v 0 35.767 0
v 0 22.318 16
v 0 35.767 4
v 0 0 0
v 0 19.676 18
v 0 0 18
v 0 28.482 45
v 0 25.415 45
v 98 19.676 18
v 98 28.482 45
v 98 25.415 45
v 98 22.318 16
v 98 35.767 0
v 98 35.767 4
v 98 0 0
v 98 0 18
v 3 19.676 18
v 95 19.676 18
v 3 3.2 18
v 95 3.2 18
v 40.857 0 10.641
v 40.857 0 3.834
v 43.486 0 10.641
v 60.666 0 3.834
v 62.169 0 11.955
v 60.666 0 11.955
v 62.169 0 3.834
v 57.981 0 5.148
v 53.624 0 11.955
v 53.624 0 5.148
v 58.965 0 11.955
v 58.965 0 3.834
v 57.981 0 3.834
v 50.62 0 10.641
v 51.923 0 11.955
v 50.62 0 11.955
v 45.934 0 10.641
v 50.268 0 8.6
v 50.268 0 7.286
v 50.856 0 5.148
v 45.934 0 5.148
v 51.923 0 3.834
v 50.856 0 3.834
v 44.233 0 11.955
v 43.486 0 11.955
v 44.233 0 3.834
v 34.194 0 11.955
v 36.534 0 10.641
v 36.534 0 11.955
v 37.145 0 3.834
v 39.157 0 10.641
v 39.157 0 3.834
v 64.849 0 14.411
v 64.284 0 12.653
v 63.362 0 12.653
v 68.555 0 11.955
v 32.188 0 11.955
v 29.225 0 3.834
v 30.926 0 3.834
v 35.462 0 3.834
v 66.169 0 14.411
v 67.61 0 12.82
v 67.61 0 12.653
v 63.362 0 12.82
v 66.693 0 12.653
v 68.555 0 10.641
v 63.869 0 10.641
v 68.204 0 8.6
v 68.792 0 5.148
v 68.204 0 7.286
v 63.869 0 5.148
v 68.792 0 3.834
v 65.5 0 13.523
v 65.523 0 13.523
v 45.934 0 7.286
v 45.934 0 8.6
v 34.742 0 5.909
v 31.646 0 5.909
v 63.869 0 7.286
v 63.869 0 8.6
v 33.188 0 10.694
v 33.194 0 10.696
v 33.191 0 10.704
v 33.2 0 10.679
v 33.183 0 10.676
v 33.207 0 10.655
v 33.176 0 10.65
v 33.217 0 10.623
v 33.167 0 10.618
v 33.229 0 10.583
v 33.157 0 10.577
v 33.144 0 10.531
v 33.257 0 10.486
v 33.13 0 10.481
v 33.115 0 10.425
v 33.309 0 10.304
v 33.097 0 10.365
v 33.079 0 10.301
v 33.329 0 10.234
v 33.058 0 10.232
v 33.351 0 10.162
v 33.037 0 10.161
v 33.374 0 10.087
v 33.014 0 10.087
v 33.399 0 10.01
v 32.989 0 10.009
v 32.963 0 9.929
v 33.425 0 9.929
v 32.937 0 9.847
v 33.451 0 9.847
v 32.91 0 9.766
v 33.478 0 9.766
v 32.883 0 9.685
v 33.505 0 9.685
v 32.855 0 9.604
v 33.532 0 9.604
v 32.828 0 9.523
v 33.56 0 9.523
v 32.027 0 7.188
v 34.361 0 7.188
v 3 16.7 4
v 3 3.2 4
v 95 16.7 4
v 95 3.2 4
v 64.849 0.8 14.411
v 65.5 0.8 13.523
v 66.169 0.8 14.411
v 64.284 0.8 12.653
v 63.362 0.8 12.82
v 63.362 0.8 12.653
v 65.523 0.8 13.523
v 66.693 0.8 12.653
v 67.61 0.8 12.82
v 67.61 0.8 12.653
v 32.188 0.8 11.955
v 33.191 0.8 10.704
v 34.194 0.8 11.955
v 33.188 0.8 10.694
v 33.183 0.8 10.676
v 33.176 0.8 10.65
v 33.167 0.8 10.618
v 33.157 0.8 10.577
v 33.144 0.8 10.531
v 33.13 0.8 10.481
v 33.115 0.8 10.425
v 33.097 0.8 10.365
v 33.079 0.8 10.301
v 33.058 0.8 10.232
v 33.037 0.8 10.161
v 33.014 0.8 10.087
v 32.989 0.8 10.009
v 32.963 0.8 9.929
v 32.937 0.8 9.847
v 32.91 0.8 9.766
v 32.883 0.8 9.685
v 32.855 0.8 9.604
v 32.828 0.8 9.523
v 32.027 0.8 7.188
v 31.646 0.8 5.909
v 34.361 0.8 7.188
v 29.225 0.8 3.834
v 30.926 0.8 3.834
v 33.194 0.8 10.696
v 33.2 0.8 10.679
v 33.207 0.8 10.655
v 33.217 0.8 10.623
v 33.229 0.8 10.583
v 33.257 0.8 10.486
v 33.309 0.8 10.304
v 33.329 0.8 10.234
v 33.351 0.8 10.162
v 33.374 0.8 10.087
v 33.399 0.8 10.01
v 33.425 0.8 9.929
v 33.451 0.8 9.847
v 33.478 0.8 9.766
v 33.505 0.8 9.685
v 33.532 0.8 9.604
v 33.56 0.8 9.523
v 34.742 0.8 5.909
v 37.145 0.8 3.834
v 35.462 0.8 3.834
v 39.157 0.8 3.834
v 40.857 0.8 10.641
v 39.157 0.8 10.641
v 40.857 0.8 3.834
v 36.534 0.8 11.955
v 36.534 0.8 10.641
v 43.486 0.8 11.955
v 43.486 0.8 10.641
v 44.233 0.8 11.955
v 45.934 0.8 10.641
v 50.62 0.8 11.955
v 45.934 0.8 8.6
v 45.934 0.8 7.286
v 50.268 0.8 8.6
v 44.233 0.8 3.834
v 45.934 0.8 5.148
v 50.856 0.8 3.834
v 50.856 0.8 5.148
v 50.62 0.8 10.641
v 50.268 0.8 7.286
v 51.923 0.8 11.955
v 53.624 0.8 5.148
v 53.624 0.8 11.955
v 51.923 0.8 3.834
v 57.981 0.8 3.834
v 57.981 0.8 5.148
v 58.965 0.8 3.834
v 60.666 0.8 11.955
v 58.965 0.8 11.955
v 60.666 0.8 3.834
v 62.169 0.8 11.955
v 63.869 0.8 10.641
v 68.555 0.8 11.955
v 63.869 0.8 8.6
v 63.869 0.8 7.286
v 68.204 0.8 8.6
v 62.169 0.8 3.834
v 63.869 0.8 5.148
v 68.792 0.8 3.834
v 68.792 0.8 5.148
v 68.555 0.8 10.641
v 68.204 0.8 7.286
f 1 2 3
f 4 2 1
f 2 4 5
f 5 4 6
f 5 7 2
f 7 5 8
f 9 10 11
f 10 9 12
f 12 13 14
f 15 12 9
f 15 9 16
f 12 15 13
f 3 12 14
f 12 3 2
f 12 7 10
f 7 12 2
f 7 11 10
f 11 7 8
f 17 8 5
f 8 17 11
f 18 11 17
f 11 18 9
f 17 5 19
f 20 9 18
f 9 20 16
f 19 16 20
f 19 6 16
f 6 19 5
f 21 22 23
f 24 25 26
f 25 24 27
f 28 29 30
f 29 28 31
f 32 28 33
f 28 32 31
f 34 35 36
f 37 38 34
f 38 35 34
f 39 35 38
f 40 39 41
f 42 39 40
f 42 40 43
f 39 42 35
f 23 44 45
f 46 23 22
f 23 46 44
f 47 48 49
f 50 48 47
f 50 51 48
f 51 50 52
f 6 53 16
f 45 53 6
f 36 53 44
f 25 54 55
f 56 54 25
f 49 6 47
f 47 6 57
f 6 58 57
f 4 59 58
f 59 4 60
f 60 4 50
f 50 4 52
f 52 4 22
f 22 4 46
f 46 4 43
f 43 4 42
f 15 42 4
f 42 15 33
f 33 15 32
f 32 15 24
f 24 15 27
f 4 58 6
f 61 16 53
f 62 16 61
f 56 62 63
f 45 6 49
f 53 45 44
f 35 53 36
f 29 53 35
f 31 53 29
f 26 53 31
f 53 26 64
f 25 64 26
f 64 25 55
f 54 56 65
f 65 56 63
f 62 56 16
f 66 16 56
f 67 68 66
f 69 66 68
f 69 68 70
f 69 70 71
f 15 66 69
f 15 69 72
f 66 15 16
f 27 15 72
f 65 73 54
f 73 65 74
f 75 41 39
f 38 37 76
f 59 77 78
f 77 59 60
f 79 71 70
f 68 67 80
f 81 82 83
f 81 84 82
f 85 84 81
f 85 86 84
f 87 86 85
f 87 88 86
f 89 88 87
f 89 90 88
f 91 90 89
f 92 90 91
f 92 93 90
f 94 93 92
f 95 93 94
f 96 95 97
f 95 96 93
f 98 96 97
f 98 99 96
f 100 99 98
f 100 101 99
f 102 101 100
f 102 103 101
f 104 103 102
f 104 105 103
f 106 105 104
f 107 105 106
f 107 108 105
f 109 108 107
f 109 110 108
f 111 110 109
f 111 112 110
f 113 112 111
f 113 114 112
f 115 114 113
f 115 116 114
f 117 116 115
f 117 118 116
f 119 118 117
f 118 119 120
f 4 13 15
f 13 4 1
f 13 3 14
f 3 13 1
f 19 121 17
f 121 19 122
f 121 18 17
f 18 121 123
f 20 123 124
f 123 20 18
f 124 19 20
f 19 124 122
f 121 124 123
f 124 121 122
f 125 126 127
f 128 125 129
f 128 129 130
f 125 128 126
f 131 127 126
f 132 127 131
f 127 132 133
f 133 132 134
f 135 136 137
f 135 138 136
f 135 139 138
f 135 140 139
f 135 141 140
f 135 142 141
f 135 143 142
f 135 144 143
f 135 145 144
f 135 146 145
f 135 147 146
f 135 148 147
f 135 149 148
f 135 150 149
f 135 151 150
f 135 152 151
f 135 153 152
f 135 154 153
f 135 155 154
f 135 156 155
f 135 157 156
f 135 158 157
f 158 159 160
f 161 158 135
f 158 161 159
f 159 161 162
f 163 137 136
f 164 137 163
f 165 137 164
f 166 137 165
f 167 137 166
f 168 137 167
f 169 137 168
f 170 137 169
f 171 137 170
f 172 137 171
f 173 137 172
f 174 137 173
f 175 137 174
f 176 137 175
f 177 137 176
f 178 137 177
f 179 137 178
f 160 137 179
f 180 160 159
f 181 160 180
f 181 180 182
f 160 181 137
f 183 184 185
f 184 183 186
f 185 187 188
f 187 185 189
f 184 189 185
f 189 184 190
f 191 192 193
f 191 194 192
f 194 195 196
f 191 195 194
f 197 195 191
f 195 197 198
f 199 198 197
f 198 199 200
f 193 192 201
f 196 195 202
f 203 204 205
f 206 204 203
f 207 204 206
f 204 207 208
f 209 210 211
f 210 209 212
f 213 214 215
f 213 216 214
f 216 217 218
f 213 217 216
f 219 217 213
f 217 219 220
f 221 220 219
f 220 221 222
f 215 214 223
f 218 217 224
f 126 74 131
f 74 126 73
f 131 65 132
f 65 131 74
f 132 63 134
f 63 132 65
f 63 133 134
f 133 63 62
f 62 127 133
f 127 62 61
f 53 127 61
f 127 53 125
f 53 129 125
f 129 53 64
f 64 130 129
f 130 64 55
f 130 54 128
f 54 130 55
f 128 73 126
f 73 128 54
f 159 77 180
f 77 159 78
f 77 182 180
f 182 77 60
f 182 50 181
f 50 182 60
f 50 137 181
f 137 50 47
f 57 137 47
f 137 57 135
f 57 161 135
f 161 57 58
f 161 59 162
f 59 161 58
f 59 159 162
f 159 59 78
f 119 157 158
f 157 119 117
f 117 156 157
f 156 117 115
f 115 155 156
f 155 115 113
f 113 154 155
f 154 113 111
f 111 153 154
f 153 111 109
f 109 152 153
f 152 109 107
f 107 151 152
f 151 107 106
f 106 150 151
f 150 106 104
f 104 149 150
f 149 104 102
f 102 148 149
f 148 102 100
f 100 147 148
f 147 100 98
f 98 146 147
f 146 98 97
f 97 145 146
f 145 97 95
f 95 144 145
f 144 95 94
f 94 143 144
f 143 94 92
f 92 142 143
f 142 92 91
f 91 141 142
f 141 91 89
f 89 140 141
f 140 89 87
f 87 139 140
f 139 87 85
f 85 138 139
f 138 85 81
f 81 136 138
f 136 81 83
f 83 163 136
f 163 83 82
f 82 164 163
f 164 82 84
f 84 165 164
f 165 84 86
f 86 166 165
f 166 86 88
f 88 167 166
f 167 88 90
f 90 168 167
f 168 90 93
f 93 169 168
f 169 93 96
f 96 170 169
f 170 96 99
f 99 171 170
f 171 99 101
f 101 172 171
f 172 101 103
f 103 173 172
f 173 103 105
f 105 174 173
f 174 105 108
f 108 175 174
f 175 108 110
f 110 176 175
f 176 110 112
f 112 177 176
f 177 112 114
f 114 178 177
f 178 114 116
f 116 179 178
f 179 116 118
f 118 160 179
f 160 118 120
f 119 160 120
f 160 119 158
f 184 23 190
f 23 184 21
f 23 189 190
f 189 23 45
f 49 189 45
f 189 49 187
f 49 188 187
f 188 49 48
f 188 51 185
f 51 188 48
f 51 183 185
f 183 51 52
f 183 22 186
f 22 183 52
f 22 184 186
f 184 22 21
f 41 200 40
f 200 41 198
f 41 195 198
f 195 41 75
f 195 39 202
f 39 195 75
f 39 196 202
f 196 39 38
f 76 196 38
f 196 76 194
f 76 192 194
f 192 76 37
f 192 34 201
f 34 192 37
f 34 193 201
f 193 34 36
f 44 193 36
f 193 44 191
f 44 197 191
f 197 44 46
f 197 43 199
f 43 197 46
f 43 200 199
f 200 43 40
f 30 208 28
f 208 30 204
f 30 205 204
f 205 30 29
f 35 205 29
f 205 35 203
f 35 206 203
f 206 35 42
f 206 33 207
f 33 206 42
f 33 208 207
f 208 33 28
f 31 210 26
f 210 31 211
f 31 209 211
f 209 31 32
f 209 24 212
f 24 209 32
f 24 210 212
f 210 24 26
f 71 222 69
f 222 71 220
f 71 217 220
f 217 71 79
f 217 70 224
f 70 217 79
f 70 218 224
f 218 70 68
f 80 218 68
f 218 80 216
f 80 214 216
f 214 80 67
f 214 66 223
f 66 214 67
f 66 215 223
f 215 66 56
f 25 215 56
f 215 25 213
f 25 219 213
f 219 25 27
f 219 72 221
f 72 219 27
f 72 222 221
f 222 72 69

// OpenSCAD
// --- Parametros do cartao e do bolso em milimetros ---
largura_cartao = 90; // Largura nominal do cartao em milimetros
altura_cartao = 50; // Altura nominal do cartao em milimetros
espessura_pilha = 12; // Espessura da pilha de cartoes no bolso em milimetros
folga_largura = 2; // Folga lateral total para acomodar os cartoes em milimetros
folga_pilha = 1.5; // Folga na profundidade do bolso para a pilha inclinada em milimetros

// --- Parametros estruturais da peca em milimetros e graus ---
angulo_inclinacao = 12; // Inclinacao do encosto para tras em graus a partir da vertical
espessura_parede = 3; // Espessura das paredes laterais e do encosto em milimetros
espessura_parede_frontal = 3.2; // Espessura da parede frontal antes da gravacao em milimetros
espessura_base = 4; // Espessura da base e da ponta do pe traseiro em milimetros
altura_aba_frontal = 18; // Altura da aba frontal e das abas laterais do bolso em milimetros
altura_total = 45; // Altura total da peca no topo do encosto em milimetros
comprimento_pe_traseiro = 16; // Extensao do pe traseiro alem da base do encosto em milimetros
altura_reforco_pe = 16; // Altura do chanfro traseiro de estabilidade no encosto em milimetros

// --- Parametros da gravacao frontal em milimetros ---
profundidade_gravacao = 0.8; // Profundidade do texto gravado na frente em milimetros
tamanho_fonte = 8.5; // Tamanho da fonte do texto gravado em milimetros
folga_booleana = 0.1; // Folga para garantir subtracoees booleanas limpas em milimetros

// --- Constantes geometricas auxiliares ---
zero = 0; // Referencia de origem e plano da mesa de impressao
fator_metade = 0.5; // Fator para divisao ao meio e centralizacao
fator_duplo = 2; // Fator para contagem de paredes duplas nas extremidades
angulo_reto = 90; // Angulo de rotacao ortogonal em graus
resolucao_curvas = 32; // Subdivisoes para renderizacao das curvas da fonte

// --- Dimensoes calculadas ---
$fn = resolucao_curvas;
largura_interna = largura_cartao + folga_largura;
largura_total = largura_interna + fator_duplo * espessura_parede;

profundidade_bolso = espessura_pilha + folga_pilha;
espessura_encosto_horizontal = espessura_parede / cos(angulo_inclinacao);

recuo_encosto_na_aba = (altura_aba_frontal - espessura_base) * tan(angulo_inclinacao);
recuo_encosto_no_reforco = (altura_reforco_pe - espessura_base) * tan(angulo_inclinacao);
recuo_encosto_no_topo = (altura_total - espessura_base) * tan(angulo_inclinacao);

y_inicio_bolso = espessura_parede_frontal;
y_fundo_bolso = y_inicio_bolso + profundidade_bolso;
y_base_traseira_encosto = y_fundo_bolso + espessura_encosto_horizontal;

y_encosto_na_aba = y_fundo_bolso + recuo_encosto_na_aba;
y_traseira_no_reforco = y_base_traseira_encosto + recuo_encosto_no_reforco;
y_topo_frontal_encosto = y_fundo_bolso + recuo_encosto_no_topo;
y_topo_traseiro_encosto = y_base_traseira_encosto + recuo_encosto_no_topo;

profundidade_total = y_base_traseira_encosto + comprimento_pe_traseiro;

// --- Exibicao das dimensoes finais no console ---
echo("Largura (mm):", largura_total);
echo("Profundidade (mm):", profundidade_total);
echo("Altura (mm):", altura_total);

// --- Construcao do solido unico ---
difference() {
    // Corpo principal extrudado a partir do perfil lateral apoiado em z = zero
    rotate([angulo_reto, zero, angulo_reto])
        linear_extrude(height = largura_total)
            polygon(points = [
                [zero, zero],
                [profundidade_total, zero],
                [profundidade_total, espessura_base],
                [y_traseira_no_reforco, altura_reforco_pe],
                [y_topo_traseiro_encosto, altura_total],
                [y_topo_frontal_encosto, altura_total],
                [y_encosto_na_aba, altura_aba_frontal],
                [zero, altura_aba_frontal]
            ]);

    // Cavidade do bolso para a pilha de cartoes preservando as paredes laterais
    translate([espessura_parede, zero, zero])
        rotate([angulo_reto, zero, angulo_reto])
            linear_extrude(height = largura_interna)
                polygon(points = [
                    [y_inicio_bolso, espessura_base],
                    [y_fundo_bolso, espessura_base],
                    [y_encosto_na_aba, altura_aba_frontal],
                    [y_encosto_na_aba - folga_booleana, altura_aba_frontal + folga_booleana],
                    [y_inicio_bolso, altura_aba_frontal + folga_booleana]
                ]);

    // Texto gravado na parede frontal
    translate([largura_total * fator_metade, profundidade_gravacao, altura_aba_frontal * fator_metade])
        rotate([angulo_reto, zero, zero])
            linear_extrude(height = profundidade_gravacao + folga_booleana)
                text(
                    "ATELIÊ",
                    size = tamanho_fonte,
                    font = "Liberation Sans:style=Bold",
                    halign = "center",
                    valign = "center"
                );
}
